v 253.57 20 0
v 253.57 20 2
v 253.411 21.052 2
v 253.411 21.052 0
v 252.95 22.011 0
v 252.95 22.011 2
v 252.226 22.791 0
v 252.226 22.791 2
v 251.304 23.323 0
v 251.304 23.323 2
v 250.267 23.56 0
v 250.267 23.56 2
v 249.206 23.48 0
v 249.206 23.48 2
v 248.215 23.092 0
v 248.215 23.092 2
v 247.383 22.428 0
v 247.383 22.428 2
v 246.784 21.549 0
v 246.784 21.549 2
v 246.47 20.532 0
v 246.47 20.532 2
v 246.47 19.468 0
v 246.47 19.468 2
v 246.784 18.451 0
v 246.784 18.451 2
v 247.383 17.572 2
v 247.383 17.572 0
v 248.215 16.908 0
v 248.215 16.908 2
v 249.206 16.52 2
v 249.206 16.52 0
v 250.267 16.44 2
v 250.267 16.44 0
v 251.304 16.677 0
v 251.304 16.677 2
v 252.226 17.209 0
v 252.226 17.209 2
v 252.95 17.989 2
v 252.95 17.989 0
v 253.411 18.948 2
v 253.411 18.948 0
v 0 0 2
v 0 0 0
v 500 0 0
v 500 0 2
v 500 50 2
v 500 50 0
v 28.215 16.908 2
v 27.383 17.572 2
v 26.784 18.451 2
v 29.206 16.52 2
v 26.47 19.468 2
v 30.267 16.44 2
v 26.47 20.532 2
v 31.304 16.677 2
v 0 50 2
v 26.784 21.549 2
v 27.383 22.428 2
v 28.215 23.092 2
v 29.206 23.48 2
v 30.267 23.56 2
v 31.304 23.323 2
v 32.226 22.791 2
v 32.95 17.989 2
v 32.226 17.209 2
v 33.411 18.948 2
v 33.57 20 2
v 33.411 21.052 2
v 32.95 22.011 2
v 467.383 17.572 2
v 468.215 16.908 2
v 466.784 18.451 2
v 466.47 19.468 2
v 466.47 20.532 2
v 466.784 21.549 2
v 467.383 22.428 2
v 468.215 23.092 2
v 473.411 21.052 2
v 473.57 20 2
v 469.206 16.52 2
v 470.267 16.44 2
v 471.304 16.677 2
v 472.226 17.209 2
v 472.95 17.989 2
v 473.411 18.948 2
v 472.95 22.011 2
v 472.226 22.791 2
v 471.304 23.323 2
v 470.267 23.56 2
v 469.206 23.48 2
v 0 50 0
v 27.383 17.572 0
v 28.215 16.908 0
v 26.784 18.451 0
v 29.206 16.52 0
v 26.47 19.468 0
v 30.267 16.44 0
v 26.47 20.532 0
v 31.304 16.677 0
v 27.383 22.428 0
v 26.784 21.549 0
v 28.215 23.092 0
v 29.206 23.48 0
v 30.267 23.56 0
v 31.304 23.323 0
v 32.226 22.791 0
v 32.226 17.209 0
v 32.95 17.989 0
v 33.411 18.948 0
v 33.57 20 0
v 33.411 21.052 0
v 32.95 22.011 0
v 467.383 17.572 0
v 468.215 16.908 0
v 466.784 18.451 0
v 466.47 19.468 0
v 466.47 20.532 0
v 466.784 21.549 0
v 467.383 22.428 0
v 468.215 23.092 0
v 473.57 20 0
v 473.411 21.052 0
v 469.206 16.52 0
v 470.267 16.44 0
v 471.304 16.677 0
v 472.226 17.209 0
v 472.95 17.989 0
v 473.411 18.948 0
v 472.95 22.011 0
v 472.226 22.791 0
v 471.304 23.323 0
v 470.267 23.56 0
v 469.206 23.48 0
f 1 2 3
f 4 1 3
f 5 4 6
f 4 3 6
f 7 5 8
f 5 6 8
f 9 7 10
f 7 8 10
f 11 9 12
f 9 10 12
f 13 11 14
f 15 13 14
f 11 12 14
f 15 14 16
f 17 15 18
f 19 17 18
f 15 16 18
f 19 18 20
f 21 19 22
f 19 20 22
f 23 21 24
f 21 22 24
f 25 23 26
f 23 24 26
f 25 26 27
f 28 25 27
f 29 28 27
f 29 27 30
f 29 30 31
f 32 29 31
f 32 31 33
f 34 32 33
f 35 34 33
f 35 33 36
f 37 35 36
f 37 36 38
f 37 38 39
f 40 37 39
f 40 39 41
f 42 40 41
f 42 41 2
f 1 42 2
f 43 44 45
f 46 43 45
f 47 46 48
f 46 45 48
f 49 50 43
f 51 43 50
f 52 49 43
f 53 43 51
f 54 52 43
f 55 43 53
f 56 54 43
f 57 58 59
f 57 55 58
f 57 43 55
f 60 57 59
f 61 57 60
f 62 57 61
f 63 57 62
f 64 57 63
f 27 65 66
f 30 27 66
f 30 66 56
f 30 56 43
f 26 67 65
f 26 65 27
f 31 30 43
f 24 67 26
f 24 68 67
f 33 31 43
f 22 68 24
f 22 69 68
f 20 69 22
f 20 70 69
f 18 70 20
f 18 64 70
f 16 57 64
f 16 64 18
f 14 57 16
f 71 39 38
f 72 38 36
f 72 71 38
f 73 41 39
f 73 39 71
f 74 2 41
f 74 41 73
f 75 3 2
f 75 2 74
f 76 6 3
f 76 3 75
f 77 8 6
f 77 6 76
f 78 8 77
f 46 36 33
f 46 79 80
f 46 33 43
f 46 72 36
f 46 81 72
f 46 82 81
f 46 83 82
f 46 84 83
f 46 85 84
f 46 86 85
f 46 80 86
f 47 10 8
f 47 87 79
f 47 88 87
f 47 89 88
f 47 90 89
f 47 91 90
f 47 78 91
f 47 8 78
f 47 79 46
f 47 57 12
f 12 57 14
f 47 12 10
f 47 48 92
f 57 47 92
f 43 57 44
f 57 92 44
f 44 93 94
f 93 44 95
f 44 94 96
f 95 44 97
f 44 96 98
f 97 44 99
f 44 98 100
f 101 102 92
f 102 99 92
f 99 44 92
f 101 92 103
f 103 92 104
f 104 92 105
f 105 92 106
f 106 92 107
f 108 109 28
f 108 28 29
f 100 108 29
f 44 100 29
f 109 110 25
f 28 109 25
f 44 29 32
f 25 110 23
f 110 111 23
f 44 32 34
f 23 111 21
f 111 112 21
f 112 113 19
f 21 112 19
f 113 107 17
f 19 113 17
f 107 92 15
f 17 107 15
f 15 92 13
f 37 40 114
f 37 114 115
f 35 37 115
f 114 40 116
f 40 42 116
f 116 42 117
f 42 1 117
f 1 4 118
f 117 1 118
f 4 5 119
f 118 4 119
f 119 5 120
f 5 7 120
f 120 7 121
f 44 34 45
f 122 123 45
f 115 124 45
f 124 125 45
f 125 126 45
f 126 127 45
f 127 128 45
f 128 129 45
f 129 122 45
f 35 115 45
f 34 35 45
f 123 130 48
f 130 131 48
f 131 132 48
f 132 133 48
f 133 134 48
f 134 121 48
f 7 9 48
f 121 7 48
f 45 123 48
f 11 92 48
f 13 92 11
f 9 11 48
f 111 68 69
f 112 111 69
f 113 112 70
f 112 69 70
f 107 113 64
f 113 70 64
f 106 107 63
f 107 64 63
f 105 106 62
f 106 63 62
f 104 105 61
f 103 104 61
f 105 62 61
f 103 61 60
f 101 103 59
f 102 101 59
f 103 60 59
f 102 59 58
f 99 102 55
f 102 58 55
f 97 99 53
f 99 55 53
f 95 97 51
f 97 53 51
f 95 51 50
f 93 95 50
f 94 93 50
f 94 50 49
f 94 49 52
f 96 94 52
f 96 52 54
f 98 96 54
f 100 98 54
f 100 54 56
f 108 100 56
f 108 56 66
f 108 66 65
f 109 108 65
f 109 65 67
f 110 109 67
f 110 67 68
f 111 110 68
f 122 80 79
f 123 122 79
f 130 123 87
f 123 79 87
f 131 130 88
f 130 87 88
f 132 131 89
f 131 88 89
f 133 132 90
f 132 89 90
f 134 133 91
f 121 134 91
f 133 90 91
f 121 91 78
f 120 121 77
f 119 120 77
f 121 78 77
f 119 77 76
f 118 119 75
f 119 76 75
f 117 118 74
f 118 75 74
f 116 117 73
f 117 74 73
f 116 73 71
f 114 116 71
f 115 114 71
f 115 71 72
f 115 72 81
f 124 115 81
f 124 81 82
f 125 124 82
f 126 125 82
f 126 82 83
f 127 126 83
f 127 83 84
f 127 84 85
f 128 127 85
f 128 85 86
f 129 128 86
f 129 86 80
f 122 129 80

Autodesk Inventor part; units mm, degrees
ref_plane "YZ Plane" through (0, 0, 0) normal (1, 0, 0) x (0, 1, 0)
ref_plane "XZ Plane" through (0, 0, 0) normal (0, 1, 0) x (-1, 0, 0)
ref_plane "XY Plane" through (0, 0, 0) normal (0, 0, 1) x (1, 0, 0)
sketch "Sketch3" plane through (0, 0, 0) normal (0, 0, 1) x (1, 0, 0)
  line L0 (0, 0) -> (500, 0)
  line L1 (500, 0) -> (500, 50)
  line L2 (500, 50) -> (0, 50)
  line L3 (0, 50) -> (0, 0)
  dimension "d5" = 50
  dimension "d6" = 500
extrude "Extrusion3" add sketch "Sketch3" along normal blind 2
sketch "Sketch6" plane through (0, 0, 2) normal (0, 0, 1) x (1, 0, 0)
  circle A0 centre (30, 20) radius 3.57
  line L0 (0, 0) -> (500, 0) projected
  circle A1 centre (250, 20) radius 3.57
  circle A2 centre (470, 20) radius 3.57
  line L1 (0, 50) -> (0, 0) projected
  line L2 (500, 0) -> (500, 50) projected
  dimension "d19" = 7.14
  dimension "d22" = 20
  dimension "d23" = 7.14
  dimension "d24" = 7.14
  dimension "d25" = 30
  dimension "d26" = 20
  dimension "d27" = 250
  dimension "d28" = 20
  dimension "d29" = 30
extrude "Extrusion4" cut sketch "Sketch6" against normal up to next
properties part number "Panel_5x50cm"
